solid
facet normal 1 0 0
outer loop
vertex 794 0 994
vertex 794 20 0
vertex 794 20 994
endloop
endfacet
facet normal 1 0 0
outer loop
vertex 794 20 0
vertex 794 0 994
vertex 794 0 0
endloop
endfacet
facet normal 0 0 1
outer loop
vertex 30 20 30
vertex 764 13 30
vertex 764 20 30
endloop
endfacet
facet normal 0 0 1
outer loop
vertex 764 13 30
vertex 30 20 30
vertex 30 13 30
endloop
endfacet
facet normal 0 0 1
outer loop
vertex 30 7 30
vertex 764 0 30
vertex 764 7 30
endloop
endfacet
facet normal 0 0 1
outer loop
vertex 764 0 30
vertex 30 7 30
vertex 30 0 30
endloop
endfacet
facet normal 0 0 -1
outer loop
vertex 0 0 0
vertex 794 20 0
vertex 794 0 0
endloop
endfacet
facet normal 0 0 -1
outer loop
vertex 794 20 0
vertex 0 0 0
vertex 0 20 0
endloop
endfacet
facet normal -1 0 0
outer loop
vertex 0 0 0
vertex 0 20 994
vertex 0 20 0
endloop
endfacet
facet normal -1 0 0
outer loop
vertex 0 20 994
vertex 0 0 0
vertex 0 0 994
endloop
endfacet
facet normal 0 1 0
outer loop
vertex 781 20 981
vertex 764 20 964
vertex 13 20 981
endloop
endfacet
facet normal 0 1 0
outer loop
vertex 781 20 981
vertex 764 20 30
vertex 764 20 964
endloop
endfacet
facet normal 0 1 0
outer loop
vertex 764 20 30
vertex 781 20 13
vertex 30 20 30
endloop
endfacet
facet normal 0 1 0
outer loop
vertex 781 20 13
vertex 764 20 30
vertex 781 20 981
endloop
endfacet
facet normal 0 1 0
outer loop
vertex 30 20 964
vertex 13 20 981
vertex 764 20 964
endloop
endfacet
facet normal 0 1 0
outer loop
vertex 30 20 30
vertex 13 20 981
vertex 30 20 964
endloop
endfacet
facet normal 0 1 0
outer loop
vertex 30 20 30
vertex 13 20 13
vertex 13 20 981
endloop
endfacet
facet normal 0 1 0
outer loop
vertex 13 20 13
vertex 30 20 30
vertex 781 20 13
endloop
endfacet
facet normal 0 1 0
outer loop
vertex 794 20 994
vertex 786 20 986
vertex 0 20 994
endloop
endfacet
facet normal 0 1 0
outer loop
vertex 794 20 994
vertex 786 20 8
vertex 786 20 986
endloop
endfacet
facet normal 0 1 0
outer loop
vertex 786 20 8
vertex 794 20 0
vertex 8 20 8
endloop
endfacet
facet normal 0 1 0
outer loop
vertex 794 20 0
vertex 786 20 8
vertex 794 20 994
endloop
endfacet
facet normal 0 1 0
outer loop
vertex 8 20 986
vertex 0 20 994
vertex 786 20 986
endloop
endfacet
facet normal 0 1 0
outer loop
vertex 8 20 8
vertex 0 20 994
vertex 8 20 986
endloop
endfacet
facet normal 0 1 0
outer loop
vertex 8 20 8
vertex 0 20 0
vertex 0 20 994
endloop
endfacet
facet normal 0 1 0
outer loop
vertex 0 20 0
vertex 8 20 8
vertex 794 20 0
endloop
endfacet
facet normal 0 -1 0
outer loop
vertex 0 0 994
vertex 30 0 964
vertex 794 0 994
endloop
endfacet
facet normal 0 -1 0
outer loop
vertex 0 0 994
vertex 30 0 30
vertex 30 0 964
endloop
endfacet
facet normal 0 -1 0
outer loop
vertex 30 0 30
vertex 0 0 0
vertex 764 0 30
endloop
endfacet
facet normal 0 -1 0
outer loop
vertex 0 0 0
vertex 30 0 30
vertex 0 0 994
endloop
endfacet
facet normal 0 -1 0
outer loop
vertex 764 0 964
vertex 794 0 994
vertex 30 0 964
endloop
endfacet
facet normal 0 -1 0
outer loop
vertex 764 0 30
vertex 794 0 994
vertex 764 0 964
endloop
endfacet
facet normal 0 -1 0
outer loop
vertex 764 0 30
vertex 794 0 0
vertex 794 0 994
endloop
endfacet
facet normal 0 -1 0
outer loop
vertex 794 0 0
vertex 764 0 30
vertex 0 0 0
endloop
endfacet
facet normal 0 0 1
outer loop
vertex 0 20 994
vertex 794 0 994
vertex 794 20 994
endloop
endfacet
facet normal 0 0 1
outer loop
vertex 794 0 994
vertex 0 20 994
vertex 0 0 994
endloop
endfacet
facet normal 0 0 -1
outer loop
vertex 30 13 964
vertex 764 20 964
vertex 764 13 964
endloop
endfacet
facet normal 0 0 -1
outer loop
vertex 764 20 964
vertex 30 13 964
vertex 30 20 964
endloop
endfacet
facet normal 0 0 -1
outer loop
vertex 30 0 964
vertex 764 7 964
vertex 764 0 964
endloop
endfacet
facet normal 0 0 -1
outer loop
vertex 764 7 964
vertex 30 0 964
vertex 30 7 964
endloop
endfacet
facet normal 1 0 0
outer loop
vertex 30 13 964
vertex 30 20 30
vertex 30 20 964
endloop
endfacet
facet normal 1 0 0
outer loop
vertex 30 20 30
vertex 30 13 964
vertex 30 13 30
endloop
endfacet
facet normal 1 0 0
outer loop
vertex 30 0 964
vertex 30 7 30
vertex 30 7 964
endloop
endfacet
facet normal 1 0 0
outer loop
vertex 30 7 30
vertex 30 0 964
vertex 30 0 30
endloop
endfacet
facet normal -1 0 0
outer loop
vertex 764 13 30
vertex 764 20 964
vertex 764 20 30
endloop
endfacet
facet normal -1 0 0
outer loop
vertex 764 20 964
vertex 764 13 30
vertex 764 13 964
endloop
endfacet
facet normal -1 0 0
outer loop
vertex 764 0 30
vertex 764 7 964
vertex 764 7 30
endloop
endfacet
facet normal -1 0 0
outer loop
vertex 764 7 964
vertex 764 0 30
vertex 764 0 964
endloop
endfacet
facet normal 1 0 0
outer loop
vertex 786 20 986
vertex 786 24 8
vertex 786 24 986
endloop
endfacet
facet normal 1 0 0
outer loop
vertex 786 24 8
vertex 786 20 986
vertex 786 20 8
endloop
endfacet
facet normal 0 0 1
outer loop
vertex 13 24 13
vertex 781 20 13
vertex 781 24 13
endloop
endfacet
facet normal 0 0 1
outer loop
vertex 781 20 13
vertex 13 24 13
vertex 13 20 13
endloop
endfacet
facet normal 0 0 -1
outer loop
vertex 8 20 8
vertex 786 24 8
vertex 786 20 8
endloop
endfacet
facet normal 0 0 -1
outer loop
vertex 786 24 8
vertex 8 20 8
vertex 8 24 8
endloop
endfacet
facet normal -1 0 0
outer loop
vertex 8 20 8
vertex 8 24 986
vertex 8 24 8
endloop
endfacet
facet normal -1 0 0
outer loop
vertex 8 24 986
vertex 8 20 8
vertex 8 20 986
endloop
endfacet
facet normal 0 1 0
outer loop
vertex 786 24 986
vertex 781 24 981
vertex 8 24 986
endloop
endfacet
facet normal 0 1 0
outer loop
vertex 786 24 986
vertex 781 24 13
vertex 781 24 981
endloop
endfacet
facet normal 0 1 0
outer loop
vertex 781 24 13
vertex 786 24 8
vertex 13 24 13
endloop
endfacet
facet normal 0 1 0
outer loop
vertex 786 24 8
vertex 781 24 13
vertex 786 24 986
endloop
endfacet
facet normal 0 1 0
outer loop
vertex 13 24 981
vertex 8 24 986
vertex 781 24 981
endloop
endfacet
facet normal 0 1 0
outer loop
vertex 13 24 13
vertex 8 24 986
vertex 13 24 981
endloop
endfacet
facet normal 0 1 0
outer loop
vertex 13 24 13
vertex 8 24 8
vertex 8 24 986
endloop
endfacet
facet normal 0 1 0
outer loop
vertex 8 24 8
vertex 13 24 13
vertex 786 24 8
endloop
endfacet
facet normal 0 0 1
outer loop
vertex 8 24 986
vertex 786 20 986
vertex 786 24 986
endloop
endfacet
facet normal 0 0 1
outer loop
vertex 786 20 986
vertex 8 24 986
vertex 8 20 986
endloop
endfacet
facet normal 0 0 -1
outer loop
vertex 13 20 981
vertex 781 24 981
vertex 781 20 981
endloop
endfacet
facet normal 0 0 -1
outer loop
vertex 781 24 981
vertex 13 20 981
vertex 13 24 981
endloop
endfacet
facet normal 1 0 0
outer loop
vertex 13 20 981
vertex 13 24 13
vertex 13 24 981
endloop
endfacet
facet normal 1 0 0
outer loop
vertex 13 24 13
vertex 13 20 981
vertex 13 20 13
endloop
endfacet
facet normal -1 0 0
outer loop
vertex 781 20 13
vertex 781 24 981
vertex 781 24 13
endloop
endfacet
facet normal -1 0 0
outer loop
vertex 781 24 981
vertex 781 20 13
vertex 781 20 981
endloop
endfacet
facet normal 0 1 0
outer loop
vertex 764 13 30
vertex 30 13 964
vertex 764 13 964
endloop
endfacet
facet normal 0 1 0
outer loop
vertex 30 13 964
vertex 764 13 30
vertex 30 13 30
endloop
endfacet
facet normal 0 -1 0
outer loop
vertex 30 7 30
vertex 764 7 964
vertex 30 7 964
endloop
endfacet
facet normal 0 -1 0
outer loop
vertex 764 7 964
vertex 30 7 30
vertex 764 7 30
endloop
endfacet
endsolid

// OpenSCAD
// file: ../config/TF3D-SDC-01_dimensions.scad
// TriFusión 3D – Smart Dry Cabinet
// Modelo TF3D-SDC-01 | Sprint 3.2 | Rev A
// Unidades: mm

CABINET_W = 800;
CABINET_H = 1000;
CABINET_D = 500;
BOARD_T = 18;

INNER_W = CABINET_W - 2*BOARD_T;
INNER_H = CABINET_H - 2*BOARD_T;

BACK_W = INNER_W;
BACK_H = INNER_H;
BACK_T = BOARD_T;

// Compartimento técnico inferior
TECH_H = 160;
TECH_LID_Z = TECH_H;

// Puerta sobrepuesta
DOOR_GAP = 3;
DOOR_W = CABINET_W - 2*DOOR_GAP;
DOOR_H = CABINET_H - 2*DOOR_GAP;
DOOR_FRAME = 30;
DOOR_FRAME_D = 20;
ACRYLIC_T = 6;
EPDM_T = 4;

// Soportes de carrete
SPOOL_ROWS = 4;
SPOOLS_PER_ROW = 4;
SPOOL_CENTERS_X = [110, 300, 490, 680];
SPOOL_ROWS_Z = [270, 475, 680, 885];
SUPPORT_PAIR_GAP = 82; // separación entre soportes de una misma bobina
ROD_D = 10;
ROD_L = 120;

// Soporte impreso
SUPPORT_W = 28;
SUPPORT_H = 72;
SUPPORT_D = 92;
MOUNT_T = 8;
CRADLE_R = 7;

// Ventilador previsto
FAN_SIZE = 120;
FAN_HOLE_SPACING = 105;
FAN_HOLE_D = 4.5;

// Apariencia
MELAMINE = [0.94,0.94,0.94];
PRINTED = [0.08,0.25,0.75];
METAL = [0.12,0.12,0.12];
ACRYLIC = [0.55,0.82,1.0,0.25];
SEAL = [0.05,0.05,0.05];
// file: ../config/common.scad
include <TF3D-SDC-01_dimensions.scad>

module board(size=[100,100,18], c=MELAMINE) {
    color(c) cube(size, center=false);
}

module rod(length=ROD_L, diameter=ROD_D) {
    color([0.65,0.65,0.68])
        rotate([0,90,0])
            cylinder(h=length, d=diameter, $fn=48);
}

module rounded_box(size=[20,20,20], r=3) {
    minkowski() {
        cube([size[0]-2*r,size[1]-2*r,size[2]-2*r]);
        sphere(r=r,$fn=24);
    }
}
// main file
include <../config/common.scad>

module door_frame() {
    // marco frontal conceptual de aluminio 30 x 20 mm
    color(METAL) {
        cube([DOOR_W, DOOR_FRAME_D, DOOR_FRAME]);
        translate([0,0,DOOR_H-DOOR_FRAME])
            cube([DOOR_W, DOOR_FRAME_D, DOOR_FRAME]);
        cube([DOOR_FRAME, DOOR_FRAME_D, DOOR_H]);
        translate([DOOR_W-DOOR_FRAME,0,0])
            cube([DOOR_FRAME, DOOR_FRAME_D, DOOR_H]);
    }
}

module acrylic_panel() {
    translate([DOOR_FRAME, (DOOR_FRAME_D-ACRYLIC_T)/2, DOOR_FRAME])
        color(ACRYLIC)
            cube([DOOR_W-2*DOOR_FRAME, ACRYLIC_T, DOOR_H-2*DOOR_FRAME]);
}

module epdm_seal() {
    // Representación del sello en la cara posterior del marco
    color(SEAL) {
        translate([8,DOOR_FRAME_D,8])
            cube([DOOR_W-16,EPDM_T,5]);
        translate([8,DOOR_FRAME_D,DOOR_H-13])
            cube([DOOR_W-16,EPDM_T,5]);
        translate([8,DOOR_FRAME_D,8])
            cube([5,EPDM_T,DOOR_H-16]);
        translate([DOOR_W-13,DOOR_FRAME_D,8])
            cube([5,EPDM_T,DOOR_H-16]);
    }
}

door_frame();
acrylic_panel();
epdm_seal();
